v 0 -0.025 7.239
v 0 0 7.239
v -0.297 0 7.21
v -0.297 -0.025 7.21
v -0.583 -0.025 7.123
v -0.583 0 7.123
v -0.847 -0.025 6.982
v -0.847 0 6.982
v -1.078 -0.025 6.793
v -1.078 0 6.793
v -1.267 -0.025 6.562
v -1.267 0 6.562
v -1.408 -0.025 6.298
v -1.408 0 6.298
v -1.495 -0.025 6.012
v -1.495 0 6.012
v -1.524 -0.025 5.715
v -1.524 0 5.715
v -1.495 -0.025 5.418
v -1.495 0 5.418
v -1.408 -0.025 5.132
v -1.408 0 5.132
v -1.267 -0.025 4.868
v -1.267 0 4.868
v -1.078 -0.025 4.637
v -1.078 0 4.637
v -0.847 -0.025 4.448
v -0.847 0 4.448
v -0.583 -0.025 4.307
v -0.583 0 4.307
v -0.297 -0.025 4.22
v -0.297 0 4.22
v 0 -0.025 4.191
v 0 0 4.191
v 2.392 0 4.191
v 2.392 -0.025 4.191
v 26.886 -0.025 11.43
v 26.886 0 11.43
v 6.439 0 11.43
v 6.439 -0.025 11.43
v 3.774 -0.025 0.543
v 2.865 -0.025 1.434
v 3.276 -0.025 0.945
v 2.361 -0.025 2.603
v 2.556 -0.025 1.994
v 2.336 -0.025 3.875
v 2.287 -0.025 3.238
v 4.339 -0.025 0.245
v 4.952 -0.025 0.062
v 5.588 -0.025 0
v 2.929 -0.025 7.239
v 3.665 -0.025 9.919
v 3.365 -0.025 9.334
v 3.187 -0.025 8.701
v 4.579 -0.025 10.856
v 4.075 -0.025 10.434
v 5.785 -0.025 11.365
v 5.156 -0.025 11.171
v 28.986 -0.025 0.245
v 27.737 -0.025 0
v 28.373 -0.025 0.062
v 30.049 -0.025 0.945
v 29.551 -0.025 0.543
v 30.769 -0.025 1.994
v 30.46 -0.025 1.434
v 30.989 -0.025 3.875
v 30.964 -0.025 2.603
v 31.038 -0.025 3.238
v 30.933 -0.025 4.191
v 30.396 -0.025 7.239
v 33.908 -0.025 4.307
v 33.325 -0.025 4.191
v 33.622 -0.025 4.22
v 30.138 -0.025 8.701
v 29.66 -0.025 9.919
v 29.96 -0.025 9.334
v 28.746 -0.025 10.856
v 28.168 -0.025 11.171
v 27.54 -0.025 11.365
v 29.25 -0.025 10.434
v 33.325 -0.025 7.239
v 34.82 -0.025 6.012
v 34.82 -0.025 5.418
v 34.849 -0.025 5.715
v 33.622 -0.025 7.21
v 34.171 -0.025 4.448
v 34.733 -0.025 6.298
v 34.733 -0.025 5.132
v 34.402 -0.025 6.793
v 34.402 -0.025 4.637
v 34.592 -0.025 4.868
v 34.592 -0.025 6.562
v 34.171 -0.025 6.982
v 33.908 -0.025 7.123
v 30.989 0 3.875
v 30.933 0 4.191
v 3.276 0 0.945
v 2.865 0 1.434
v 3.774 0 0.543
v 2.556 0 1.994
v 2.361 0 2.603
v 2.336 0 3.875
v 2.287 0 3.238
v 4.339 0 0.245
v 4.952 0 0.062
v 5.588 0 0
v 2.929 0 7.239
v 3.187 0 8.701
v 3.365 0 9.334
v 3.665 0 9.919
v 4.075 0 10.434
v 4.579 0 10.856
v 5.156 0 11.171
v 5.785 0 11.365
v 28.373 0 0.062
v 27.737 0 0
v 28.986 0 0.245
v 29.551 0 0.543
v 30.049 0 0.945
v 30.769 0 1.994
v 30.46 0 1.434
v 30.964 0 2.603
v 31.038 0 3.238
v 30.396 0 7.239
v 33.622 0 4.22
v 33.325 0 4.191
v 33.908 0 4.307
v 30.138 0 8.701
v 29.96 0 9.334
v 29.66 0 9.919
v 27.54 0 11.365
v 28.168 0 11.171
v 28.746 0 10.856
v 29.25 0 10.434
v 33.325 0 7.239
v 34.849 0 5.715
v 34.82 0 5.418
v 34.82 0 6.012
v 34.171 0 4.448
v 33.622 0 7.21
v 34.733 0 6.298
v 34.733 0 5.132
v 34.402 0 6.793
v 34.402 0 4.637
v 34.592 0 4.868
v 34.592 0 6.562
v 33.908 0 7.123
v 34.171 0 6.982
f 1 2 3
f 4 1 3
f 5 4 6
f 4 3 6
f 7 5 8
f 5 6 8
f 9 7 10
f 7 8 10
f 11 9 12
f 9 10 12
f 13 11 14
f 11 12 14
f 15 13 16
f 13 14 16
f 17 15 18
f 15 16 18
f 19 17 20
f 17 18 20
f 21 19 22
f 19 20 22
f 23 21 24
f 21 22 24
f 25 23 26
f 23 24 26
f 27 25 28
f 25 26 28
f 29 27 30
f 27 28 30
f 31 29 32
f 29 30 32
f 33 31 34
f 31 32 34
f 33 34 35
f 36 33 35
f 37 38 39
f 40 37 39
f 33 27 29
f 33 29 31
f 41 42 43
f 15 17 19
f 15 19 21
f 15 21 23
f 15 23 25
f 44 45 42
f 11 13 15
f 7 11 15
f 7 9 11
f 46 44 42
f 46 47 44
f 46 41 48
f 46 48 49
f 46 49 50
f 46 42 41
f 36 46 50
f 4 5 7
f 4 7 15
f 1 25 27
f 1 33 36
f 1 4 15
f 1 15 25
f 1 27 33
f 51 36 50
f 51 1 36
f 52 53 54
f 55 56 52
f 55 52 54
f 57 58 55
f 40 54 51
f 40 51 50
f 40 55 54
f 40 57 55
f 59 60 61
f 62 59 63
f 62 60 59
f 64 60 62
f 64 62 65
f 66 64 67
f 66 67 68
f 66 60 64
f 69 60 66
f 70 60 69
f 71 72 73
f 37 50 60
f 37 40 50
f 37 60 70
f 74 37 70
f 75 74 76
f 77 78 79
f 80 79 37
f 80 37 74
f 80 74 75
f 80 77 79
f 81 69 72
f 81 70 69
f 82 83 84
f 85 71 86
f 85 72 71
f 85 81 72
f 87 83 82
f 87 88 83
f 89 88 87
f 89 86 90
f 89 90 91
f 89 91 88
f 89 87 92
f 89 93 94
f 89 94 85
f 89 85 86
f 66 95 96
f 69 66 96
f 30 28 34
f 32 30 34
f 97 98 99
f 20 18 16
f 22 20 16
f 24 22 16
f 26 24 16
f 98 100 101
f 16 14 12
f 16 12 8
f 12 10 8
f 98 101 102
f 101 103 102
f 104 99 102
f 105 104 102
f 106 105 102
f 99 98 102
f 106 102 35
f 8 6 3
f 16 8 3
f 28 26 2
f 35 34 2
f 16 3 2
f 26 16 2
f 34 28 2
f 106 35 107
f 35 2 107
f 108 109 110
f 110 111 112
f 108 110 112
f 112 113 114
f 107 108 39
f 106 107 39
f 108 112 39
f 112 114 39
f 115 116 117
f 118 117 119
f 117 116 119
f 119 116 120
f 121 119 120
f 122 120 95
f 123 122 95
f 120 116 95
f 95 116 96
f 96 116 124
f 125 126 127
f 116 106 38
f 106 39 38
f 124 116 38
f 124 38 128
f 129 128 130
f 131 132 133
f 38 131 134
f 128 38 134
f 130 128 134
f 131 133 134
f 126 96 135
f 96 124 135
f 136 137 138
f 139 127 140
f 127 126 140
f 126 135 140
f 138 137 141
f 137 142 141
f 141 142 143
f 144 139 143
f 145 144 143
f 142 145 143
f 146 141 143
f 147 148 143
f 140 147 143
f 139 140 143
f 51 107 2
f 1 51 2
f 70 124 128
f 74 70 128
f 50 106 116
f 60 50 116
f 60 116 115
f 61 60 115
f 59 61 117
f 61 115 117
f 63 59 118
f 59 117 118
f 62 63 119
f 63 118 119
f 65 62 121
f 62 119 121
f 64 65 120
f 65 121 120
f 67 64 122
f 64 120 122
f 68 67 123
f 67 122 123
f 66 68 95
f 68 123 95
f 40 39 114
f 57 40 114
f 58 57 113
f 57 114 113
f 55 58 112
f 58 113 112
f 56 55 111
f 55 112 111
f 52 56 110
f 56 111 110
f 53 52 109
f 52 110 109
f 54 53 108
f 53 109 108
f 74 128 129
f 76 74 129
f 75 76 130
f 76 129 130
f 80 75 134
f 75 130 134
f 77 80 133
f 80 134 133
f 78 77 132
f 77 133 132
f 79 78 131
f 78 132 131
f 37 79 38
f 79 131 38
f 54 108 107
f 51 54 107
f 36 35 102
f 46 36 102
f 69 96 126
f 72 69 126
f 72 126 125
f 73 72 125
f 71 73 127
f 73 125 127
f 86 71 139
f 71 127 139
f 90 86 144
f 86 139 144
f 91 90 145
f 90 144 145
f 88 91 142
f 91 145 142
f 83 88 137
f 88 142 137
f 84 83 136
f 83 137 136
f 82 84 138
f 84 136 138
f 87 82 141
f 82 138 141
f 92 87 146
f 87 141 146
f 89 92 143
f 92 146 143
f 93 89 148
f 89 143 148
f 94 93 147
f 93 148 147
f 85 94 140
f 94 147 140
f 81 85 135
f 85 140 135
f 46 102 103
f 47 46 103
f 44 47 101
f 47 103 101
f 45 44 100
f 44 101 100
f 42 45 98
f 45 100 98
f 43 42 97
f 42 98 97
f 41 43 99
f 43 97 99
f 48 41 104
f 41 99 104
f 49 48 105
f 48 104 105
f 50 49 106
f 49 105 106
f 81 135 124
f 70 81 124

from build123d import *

# Parameters (mm, degrees)
F1_DEPTH = 0.0254


with BuildPart() as f1:
    # F0 (on Front) → F1 (new body)
    with BuildSketch(Plane.XZ):
        with BuildLine():
            ThreePointArc((6.438954, 11.43), (4.316469, 10.657479), (3.187119, 8.701386))
            Line((3.187119, 8.701386), (2.929261, 7.239))
            Line((2.929261, 7.239), (0, 7.239))
            ThreePointArc((0, 7.239), (-1.524, 5.715), (0, 4.191))
            Line((0, 4.191), (2.391816, 4.191))
            Line((2.391816, 4.191), (2.336165, 3.875386))
            ThreePointArc((2.336165, 3.875386), (3.058521, 1.179515), (5.588, 0))
            Line((5.588, 0), (27.7368, 0))
            ThreePointArc((27.7368, 0), (30.266279, 1.179515), (30.988635, 3.875386))
            Line((30.988635, 3.875386), (30.932984, 4.191))
            Line((30.932984, 4.191), (33.3248, 4.191))
            ThreePointArc((33.3248, 4.191), (34.8488, 5.715), (33.3248, 7.239))
            Line((33.3248, 7.239), (30.395539, 7.239))
            Line((30.395539, 7.239), (30.137681, 8.701386))
            ThreePointArc((30.137681, 8.701386), (29.008331, 10.657479), (26.885846, 11.43))
            Line((26.885846, 11.43), (6.438954, 11.43))
        make_face()
    extrude(amount=F1_DEPTH)


solid = f1.part
